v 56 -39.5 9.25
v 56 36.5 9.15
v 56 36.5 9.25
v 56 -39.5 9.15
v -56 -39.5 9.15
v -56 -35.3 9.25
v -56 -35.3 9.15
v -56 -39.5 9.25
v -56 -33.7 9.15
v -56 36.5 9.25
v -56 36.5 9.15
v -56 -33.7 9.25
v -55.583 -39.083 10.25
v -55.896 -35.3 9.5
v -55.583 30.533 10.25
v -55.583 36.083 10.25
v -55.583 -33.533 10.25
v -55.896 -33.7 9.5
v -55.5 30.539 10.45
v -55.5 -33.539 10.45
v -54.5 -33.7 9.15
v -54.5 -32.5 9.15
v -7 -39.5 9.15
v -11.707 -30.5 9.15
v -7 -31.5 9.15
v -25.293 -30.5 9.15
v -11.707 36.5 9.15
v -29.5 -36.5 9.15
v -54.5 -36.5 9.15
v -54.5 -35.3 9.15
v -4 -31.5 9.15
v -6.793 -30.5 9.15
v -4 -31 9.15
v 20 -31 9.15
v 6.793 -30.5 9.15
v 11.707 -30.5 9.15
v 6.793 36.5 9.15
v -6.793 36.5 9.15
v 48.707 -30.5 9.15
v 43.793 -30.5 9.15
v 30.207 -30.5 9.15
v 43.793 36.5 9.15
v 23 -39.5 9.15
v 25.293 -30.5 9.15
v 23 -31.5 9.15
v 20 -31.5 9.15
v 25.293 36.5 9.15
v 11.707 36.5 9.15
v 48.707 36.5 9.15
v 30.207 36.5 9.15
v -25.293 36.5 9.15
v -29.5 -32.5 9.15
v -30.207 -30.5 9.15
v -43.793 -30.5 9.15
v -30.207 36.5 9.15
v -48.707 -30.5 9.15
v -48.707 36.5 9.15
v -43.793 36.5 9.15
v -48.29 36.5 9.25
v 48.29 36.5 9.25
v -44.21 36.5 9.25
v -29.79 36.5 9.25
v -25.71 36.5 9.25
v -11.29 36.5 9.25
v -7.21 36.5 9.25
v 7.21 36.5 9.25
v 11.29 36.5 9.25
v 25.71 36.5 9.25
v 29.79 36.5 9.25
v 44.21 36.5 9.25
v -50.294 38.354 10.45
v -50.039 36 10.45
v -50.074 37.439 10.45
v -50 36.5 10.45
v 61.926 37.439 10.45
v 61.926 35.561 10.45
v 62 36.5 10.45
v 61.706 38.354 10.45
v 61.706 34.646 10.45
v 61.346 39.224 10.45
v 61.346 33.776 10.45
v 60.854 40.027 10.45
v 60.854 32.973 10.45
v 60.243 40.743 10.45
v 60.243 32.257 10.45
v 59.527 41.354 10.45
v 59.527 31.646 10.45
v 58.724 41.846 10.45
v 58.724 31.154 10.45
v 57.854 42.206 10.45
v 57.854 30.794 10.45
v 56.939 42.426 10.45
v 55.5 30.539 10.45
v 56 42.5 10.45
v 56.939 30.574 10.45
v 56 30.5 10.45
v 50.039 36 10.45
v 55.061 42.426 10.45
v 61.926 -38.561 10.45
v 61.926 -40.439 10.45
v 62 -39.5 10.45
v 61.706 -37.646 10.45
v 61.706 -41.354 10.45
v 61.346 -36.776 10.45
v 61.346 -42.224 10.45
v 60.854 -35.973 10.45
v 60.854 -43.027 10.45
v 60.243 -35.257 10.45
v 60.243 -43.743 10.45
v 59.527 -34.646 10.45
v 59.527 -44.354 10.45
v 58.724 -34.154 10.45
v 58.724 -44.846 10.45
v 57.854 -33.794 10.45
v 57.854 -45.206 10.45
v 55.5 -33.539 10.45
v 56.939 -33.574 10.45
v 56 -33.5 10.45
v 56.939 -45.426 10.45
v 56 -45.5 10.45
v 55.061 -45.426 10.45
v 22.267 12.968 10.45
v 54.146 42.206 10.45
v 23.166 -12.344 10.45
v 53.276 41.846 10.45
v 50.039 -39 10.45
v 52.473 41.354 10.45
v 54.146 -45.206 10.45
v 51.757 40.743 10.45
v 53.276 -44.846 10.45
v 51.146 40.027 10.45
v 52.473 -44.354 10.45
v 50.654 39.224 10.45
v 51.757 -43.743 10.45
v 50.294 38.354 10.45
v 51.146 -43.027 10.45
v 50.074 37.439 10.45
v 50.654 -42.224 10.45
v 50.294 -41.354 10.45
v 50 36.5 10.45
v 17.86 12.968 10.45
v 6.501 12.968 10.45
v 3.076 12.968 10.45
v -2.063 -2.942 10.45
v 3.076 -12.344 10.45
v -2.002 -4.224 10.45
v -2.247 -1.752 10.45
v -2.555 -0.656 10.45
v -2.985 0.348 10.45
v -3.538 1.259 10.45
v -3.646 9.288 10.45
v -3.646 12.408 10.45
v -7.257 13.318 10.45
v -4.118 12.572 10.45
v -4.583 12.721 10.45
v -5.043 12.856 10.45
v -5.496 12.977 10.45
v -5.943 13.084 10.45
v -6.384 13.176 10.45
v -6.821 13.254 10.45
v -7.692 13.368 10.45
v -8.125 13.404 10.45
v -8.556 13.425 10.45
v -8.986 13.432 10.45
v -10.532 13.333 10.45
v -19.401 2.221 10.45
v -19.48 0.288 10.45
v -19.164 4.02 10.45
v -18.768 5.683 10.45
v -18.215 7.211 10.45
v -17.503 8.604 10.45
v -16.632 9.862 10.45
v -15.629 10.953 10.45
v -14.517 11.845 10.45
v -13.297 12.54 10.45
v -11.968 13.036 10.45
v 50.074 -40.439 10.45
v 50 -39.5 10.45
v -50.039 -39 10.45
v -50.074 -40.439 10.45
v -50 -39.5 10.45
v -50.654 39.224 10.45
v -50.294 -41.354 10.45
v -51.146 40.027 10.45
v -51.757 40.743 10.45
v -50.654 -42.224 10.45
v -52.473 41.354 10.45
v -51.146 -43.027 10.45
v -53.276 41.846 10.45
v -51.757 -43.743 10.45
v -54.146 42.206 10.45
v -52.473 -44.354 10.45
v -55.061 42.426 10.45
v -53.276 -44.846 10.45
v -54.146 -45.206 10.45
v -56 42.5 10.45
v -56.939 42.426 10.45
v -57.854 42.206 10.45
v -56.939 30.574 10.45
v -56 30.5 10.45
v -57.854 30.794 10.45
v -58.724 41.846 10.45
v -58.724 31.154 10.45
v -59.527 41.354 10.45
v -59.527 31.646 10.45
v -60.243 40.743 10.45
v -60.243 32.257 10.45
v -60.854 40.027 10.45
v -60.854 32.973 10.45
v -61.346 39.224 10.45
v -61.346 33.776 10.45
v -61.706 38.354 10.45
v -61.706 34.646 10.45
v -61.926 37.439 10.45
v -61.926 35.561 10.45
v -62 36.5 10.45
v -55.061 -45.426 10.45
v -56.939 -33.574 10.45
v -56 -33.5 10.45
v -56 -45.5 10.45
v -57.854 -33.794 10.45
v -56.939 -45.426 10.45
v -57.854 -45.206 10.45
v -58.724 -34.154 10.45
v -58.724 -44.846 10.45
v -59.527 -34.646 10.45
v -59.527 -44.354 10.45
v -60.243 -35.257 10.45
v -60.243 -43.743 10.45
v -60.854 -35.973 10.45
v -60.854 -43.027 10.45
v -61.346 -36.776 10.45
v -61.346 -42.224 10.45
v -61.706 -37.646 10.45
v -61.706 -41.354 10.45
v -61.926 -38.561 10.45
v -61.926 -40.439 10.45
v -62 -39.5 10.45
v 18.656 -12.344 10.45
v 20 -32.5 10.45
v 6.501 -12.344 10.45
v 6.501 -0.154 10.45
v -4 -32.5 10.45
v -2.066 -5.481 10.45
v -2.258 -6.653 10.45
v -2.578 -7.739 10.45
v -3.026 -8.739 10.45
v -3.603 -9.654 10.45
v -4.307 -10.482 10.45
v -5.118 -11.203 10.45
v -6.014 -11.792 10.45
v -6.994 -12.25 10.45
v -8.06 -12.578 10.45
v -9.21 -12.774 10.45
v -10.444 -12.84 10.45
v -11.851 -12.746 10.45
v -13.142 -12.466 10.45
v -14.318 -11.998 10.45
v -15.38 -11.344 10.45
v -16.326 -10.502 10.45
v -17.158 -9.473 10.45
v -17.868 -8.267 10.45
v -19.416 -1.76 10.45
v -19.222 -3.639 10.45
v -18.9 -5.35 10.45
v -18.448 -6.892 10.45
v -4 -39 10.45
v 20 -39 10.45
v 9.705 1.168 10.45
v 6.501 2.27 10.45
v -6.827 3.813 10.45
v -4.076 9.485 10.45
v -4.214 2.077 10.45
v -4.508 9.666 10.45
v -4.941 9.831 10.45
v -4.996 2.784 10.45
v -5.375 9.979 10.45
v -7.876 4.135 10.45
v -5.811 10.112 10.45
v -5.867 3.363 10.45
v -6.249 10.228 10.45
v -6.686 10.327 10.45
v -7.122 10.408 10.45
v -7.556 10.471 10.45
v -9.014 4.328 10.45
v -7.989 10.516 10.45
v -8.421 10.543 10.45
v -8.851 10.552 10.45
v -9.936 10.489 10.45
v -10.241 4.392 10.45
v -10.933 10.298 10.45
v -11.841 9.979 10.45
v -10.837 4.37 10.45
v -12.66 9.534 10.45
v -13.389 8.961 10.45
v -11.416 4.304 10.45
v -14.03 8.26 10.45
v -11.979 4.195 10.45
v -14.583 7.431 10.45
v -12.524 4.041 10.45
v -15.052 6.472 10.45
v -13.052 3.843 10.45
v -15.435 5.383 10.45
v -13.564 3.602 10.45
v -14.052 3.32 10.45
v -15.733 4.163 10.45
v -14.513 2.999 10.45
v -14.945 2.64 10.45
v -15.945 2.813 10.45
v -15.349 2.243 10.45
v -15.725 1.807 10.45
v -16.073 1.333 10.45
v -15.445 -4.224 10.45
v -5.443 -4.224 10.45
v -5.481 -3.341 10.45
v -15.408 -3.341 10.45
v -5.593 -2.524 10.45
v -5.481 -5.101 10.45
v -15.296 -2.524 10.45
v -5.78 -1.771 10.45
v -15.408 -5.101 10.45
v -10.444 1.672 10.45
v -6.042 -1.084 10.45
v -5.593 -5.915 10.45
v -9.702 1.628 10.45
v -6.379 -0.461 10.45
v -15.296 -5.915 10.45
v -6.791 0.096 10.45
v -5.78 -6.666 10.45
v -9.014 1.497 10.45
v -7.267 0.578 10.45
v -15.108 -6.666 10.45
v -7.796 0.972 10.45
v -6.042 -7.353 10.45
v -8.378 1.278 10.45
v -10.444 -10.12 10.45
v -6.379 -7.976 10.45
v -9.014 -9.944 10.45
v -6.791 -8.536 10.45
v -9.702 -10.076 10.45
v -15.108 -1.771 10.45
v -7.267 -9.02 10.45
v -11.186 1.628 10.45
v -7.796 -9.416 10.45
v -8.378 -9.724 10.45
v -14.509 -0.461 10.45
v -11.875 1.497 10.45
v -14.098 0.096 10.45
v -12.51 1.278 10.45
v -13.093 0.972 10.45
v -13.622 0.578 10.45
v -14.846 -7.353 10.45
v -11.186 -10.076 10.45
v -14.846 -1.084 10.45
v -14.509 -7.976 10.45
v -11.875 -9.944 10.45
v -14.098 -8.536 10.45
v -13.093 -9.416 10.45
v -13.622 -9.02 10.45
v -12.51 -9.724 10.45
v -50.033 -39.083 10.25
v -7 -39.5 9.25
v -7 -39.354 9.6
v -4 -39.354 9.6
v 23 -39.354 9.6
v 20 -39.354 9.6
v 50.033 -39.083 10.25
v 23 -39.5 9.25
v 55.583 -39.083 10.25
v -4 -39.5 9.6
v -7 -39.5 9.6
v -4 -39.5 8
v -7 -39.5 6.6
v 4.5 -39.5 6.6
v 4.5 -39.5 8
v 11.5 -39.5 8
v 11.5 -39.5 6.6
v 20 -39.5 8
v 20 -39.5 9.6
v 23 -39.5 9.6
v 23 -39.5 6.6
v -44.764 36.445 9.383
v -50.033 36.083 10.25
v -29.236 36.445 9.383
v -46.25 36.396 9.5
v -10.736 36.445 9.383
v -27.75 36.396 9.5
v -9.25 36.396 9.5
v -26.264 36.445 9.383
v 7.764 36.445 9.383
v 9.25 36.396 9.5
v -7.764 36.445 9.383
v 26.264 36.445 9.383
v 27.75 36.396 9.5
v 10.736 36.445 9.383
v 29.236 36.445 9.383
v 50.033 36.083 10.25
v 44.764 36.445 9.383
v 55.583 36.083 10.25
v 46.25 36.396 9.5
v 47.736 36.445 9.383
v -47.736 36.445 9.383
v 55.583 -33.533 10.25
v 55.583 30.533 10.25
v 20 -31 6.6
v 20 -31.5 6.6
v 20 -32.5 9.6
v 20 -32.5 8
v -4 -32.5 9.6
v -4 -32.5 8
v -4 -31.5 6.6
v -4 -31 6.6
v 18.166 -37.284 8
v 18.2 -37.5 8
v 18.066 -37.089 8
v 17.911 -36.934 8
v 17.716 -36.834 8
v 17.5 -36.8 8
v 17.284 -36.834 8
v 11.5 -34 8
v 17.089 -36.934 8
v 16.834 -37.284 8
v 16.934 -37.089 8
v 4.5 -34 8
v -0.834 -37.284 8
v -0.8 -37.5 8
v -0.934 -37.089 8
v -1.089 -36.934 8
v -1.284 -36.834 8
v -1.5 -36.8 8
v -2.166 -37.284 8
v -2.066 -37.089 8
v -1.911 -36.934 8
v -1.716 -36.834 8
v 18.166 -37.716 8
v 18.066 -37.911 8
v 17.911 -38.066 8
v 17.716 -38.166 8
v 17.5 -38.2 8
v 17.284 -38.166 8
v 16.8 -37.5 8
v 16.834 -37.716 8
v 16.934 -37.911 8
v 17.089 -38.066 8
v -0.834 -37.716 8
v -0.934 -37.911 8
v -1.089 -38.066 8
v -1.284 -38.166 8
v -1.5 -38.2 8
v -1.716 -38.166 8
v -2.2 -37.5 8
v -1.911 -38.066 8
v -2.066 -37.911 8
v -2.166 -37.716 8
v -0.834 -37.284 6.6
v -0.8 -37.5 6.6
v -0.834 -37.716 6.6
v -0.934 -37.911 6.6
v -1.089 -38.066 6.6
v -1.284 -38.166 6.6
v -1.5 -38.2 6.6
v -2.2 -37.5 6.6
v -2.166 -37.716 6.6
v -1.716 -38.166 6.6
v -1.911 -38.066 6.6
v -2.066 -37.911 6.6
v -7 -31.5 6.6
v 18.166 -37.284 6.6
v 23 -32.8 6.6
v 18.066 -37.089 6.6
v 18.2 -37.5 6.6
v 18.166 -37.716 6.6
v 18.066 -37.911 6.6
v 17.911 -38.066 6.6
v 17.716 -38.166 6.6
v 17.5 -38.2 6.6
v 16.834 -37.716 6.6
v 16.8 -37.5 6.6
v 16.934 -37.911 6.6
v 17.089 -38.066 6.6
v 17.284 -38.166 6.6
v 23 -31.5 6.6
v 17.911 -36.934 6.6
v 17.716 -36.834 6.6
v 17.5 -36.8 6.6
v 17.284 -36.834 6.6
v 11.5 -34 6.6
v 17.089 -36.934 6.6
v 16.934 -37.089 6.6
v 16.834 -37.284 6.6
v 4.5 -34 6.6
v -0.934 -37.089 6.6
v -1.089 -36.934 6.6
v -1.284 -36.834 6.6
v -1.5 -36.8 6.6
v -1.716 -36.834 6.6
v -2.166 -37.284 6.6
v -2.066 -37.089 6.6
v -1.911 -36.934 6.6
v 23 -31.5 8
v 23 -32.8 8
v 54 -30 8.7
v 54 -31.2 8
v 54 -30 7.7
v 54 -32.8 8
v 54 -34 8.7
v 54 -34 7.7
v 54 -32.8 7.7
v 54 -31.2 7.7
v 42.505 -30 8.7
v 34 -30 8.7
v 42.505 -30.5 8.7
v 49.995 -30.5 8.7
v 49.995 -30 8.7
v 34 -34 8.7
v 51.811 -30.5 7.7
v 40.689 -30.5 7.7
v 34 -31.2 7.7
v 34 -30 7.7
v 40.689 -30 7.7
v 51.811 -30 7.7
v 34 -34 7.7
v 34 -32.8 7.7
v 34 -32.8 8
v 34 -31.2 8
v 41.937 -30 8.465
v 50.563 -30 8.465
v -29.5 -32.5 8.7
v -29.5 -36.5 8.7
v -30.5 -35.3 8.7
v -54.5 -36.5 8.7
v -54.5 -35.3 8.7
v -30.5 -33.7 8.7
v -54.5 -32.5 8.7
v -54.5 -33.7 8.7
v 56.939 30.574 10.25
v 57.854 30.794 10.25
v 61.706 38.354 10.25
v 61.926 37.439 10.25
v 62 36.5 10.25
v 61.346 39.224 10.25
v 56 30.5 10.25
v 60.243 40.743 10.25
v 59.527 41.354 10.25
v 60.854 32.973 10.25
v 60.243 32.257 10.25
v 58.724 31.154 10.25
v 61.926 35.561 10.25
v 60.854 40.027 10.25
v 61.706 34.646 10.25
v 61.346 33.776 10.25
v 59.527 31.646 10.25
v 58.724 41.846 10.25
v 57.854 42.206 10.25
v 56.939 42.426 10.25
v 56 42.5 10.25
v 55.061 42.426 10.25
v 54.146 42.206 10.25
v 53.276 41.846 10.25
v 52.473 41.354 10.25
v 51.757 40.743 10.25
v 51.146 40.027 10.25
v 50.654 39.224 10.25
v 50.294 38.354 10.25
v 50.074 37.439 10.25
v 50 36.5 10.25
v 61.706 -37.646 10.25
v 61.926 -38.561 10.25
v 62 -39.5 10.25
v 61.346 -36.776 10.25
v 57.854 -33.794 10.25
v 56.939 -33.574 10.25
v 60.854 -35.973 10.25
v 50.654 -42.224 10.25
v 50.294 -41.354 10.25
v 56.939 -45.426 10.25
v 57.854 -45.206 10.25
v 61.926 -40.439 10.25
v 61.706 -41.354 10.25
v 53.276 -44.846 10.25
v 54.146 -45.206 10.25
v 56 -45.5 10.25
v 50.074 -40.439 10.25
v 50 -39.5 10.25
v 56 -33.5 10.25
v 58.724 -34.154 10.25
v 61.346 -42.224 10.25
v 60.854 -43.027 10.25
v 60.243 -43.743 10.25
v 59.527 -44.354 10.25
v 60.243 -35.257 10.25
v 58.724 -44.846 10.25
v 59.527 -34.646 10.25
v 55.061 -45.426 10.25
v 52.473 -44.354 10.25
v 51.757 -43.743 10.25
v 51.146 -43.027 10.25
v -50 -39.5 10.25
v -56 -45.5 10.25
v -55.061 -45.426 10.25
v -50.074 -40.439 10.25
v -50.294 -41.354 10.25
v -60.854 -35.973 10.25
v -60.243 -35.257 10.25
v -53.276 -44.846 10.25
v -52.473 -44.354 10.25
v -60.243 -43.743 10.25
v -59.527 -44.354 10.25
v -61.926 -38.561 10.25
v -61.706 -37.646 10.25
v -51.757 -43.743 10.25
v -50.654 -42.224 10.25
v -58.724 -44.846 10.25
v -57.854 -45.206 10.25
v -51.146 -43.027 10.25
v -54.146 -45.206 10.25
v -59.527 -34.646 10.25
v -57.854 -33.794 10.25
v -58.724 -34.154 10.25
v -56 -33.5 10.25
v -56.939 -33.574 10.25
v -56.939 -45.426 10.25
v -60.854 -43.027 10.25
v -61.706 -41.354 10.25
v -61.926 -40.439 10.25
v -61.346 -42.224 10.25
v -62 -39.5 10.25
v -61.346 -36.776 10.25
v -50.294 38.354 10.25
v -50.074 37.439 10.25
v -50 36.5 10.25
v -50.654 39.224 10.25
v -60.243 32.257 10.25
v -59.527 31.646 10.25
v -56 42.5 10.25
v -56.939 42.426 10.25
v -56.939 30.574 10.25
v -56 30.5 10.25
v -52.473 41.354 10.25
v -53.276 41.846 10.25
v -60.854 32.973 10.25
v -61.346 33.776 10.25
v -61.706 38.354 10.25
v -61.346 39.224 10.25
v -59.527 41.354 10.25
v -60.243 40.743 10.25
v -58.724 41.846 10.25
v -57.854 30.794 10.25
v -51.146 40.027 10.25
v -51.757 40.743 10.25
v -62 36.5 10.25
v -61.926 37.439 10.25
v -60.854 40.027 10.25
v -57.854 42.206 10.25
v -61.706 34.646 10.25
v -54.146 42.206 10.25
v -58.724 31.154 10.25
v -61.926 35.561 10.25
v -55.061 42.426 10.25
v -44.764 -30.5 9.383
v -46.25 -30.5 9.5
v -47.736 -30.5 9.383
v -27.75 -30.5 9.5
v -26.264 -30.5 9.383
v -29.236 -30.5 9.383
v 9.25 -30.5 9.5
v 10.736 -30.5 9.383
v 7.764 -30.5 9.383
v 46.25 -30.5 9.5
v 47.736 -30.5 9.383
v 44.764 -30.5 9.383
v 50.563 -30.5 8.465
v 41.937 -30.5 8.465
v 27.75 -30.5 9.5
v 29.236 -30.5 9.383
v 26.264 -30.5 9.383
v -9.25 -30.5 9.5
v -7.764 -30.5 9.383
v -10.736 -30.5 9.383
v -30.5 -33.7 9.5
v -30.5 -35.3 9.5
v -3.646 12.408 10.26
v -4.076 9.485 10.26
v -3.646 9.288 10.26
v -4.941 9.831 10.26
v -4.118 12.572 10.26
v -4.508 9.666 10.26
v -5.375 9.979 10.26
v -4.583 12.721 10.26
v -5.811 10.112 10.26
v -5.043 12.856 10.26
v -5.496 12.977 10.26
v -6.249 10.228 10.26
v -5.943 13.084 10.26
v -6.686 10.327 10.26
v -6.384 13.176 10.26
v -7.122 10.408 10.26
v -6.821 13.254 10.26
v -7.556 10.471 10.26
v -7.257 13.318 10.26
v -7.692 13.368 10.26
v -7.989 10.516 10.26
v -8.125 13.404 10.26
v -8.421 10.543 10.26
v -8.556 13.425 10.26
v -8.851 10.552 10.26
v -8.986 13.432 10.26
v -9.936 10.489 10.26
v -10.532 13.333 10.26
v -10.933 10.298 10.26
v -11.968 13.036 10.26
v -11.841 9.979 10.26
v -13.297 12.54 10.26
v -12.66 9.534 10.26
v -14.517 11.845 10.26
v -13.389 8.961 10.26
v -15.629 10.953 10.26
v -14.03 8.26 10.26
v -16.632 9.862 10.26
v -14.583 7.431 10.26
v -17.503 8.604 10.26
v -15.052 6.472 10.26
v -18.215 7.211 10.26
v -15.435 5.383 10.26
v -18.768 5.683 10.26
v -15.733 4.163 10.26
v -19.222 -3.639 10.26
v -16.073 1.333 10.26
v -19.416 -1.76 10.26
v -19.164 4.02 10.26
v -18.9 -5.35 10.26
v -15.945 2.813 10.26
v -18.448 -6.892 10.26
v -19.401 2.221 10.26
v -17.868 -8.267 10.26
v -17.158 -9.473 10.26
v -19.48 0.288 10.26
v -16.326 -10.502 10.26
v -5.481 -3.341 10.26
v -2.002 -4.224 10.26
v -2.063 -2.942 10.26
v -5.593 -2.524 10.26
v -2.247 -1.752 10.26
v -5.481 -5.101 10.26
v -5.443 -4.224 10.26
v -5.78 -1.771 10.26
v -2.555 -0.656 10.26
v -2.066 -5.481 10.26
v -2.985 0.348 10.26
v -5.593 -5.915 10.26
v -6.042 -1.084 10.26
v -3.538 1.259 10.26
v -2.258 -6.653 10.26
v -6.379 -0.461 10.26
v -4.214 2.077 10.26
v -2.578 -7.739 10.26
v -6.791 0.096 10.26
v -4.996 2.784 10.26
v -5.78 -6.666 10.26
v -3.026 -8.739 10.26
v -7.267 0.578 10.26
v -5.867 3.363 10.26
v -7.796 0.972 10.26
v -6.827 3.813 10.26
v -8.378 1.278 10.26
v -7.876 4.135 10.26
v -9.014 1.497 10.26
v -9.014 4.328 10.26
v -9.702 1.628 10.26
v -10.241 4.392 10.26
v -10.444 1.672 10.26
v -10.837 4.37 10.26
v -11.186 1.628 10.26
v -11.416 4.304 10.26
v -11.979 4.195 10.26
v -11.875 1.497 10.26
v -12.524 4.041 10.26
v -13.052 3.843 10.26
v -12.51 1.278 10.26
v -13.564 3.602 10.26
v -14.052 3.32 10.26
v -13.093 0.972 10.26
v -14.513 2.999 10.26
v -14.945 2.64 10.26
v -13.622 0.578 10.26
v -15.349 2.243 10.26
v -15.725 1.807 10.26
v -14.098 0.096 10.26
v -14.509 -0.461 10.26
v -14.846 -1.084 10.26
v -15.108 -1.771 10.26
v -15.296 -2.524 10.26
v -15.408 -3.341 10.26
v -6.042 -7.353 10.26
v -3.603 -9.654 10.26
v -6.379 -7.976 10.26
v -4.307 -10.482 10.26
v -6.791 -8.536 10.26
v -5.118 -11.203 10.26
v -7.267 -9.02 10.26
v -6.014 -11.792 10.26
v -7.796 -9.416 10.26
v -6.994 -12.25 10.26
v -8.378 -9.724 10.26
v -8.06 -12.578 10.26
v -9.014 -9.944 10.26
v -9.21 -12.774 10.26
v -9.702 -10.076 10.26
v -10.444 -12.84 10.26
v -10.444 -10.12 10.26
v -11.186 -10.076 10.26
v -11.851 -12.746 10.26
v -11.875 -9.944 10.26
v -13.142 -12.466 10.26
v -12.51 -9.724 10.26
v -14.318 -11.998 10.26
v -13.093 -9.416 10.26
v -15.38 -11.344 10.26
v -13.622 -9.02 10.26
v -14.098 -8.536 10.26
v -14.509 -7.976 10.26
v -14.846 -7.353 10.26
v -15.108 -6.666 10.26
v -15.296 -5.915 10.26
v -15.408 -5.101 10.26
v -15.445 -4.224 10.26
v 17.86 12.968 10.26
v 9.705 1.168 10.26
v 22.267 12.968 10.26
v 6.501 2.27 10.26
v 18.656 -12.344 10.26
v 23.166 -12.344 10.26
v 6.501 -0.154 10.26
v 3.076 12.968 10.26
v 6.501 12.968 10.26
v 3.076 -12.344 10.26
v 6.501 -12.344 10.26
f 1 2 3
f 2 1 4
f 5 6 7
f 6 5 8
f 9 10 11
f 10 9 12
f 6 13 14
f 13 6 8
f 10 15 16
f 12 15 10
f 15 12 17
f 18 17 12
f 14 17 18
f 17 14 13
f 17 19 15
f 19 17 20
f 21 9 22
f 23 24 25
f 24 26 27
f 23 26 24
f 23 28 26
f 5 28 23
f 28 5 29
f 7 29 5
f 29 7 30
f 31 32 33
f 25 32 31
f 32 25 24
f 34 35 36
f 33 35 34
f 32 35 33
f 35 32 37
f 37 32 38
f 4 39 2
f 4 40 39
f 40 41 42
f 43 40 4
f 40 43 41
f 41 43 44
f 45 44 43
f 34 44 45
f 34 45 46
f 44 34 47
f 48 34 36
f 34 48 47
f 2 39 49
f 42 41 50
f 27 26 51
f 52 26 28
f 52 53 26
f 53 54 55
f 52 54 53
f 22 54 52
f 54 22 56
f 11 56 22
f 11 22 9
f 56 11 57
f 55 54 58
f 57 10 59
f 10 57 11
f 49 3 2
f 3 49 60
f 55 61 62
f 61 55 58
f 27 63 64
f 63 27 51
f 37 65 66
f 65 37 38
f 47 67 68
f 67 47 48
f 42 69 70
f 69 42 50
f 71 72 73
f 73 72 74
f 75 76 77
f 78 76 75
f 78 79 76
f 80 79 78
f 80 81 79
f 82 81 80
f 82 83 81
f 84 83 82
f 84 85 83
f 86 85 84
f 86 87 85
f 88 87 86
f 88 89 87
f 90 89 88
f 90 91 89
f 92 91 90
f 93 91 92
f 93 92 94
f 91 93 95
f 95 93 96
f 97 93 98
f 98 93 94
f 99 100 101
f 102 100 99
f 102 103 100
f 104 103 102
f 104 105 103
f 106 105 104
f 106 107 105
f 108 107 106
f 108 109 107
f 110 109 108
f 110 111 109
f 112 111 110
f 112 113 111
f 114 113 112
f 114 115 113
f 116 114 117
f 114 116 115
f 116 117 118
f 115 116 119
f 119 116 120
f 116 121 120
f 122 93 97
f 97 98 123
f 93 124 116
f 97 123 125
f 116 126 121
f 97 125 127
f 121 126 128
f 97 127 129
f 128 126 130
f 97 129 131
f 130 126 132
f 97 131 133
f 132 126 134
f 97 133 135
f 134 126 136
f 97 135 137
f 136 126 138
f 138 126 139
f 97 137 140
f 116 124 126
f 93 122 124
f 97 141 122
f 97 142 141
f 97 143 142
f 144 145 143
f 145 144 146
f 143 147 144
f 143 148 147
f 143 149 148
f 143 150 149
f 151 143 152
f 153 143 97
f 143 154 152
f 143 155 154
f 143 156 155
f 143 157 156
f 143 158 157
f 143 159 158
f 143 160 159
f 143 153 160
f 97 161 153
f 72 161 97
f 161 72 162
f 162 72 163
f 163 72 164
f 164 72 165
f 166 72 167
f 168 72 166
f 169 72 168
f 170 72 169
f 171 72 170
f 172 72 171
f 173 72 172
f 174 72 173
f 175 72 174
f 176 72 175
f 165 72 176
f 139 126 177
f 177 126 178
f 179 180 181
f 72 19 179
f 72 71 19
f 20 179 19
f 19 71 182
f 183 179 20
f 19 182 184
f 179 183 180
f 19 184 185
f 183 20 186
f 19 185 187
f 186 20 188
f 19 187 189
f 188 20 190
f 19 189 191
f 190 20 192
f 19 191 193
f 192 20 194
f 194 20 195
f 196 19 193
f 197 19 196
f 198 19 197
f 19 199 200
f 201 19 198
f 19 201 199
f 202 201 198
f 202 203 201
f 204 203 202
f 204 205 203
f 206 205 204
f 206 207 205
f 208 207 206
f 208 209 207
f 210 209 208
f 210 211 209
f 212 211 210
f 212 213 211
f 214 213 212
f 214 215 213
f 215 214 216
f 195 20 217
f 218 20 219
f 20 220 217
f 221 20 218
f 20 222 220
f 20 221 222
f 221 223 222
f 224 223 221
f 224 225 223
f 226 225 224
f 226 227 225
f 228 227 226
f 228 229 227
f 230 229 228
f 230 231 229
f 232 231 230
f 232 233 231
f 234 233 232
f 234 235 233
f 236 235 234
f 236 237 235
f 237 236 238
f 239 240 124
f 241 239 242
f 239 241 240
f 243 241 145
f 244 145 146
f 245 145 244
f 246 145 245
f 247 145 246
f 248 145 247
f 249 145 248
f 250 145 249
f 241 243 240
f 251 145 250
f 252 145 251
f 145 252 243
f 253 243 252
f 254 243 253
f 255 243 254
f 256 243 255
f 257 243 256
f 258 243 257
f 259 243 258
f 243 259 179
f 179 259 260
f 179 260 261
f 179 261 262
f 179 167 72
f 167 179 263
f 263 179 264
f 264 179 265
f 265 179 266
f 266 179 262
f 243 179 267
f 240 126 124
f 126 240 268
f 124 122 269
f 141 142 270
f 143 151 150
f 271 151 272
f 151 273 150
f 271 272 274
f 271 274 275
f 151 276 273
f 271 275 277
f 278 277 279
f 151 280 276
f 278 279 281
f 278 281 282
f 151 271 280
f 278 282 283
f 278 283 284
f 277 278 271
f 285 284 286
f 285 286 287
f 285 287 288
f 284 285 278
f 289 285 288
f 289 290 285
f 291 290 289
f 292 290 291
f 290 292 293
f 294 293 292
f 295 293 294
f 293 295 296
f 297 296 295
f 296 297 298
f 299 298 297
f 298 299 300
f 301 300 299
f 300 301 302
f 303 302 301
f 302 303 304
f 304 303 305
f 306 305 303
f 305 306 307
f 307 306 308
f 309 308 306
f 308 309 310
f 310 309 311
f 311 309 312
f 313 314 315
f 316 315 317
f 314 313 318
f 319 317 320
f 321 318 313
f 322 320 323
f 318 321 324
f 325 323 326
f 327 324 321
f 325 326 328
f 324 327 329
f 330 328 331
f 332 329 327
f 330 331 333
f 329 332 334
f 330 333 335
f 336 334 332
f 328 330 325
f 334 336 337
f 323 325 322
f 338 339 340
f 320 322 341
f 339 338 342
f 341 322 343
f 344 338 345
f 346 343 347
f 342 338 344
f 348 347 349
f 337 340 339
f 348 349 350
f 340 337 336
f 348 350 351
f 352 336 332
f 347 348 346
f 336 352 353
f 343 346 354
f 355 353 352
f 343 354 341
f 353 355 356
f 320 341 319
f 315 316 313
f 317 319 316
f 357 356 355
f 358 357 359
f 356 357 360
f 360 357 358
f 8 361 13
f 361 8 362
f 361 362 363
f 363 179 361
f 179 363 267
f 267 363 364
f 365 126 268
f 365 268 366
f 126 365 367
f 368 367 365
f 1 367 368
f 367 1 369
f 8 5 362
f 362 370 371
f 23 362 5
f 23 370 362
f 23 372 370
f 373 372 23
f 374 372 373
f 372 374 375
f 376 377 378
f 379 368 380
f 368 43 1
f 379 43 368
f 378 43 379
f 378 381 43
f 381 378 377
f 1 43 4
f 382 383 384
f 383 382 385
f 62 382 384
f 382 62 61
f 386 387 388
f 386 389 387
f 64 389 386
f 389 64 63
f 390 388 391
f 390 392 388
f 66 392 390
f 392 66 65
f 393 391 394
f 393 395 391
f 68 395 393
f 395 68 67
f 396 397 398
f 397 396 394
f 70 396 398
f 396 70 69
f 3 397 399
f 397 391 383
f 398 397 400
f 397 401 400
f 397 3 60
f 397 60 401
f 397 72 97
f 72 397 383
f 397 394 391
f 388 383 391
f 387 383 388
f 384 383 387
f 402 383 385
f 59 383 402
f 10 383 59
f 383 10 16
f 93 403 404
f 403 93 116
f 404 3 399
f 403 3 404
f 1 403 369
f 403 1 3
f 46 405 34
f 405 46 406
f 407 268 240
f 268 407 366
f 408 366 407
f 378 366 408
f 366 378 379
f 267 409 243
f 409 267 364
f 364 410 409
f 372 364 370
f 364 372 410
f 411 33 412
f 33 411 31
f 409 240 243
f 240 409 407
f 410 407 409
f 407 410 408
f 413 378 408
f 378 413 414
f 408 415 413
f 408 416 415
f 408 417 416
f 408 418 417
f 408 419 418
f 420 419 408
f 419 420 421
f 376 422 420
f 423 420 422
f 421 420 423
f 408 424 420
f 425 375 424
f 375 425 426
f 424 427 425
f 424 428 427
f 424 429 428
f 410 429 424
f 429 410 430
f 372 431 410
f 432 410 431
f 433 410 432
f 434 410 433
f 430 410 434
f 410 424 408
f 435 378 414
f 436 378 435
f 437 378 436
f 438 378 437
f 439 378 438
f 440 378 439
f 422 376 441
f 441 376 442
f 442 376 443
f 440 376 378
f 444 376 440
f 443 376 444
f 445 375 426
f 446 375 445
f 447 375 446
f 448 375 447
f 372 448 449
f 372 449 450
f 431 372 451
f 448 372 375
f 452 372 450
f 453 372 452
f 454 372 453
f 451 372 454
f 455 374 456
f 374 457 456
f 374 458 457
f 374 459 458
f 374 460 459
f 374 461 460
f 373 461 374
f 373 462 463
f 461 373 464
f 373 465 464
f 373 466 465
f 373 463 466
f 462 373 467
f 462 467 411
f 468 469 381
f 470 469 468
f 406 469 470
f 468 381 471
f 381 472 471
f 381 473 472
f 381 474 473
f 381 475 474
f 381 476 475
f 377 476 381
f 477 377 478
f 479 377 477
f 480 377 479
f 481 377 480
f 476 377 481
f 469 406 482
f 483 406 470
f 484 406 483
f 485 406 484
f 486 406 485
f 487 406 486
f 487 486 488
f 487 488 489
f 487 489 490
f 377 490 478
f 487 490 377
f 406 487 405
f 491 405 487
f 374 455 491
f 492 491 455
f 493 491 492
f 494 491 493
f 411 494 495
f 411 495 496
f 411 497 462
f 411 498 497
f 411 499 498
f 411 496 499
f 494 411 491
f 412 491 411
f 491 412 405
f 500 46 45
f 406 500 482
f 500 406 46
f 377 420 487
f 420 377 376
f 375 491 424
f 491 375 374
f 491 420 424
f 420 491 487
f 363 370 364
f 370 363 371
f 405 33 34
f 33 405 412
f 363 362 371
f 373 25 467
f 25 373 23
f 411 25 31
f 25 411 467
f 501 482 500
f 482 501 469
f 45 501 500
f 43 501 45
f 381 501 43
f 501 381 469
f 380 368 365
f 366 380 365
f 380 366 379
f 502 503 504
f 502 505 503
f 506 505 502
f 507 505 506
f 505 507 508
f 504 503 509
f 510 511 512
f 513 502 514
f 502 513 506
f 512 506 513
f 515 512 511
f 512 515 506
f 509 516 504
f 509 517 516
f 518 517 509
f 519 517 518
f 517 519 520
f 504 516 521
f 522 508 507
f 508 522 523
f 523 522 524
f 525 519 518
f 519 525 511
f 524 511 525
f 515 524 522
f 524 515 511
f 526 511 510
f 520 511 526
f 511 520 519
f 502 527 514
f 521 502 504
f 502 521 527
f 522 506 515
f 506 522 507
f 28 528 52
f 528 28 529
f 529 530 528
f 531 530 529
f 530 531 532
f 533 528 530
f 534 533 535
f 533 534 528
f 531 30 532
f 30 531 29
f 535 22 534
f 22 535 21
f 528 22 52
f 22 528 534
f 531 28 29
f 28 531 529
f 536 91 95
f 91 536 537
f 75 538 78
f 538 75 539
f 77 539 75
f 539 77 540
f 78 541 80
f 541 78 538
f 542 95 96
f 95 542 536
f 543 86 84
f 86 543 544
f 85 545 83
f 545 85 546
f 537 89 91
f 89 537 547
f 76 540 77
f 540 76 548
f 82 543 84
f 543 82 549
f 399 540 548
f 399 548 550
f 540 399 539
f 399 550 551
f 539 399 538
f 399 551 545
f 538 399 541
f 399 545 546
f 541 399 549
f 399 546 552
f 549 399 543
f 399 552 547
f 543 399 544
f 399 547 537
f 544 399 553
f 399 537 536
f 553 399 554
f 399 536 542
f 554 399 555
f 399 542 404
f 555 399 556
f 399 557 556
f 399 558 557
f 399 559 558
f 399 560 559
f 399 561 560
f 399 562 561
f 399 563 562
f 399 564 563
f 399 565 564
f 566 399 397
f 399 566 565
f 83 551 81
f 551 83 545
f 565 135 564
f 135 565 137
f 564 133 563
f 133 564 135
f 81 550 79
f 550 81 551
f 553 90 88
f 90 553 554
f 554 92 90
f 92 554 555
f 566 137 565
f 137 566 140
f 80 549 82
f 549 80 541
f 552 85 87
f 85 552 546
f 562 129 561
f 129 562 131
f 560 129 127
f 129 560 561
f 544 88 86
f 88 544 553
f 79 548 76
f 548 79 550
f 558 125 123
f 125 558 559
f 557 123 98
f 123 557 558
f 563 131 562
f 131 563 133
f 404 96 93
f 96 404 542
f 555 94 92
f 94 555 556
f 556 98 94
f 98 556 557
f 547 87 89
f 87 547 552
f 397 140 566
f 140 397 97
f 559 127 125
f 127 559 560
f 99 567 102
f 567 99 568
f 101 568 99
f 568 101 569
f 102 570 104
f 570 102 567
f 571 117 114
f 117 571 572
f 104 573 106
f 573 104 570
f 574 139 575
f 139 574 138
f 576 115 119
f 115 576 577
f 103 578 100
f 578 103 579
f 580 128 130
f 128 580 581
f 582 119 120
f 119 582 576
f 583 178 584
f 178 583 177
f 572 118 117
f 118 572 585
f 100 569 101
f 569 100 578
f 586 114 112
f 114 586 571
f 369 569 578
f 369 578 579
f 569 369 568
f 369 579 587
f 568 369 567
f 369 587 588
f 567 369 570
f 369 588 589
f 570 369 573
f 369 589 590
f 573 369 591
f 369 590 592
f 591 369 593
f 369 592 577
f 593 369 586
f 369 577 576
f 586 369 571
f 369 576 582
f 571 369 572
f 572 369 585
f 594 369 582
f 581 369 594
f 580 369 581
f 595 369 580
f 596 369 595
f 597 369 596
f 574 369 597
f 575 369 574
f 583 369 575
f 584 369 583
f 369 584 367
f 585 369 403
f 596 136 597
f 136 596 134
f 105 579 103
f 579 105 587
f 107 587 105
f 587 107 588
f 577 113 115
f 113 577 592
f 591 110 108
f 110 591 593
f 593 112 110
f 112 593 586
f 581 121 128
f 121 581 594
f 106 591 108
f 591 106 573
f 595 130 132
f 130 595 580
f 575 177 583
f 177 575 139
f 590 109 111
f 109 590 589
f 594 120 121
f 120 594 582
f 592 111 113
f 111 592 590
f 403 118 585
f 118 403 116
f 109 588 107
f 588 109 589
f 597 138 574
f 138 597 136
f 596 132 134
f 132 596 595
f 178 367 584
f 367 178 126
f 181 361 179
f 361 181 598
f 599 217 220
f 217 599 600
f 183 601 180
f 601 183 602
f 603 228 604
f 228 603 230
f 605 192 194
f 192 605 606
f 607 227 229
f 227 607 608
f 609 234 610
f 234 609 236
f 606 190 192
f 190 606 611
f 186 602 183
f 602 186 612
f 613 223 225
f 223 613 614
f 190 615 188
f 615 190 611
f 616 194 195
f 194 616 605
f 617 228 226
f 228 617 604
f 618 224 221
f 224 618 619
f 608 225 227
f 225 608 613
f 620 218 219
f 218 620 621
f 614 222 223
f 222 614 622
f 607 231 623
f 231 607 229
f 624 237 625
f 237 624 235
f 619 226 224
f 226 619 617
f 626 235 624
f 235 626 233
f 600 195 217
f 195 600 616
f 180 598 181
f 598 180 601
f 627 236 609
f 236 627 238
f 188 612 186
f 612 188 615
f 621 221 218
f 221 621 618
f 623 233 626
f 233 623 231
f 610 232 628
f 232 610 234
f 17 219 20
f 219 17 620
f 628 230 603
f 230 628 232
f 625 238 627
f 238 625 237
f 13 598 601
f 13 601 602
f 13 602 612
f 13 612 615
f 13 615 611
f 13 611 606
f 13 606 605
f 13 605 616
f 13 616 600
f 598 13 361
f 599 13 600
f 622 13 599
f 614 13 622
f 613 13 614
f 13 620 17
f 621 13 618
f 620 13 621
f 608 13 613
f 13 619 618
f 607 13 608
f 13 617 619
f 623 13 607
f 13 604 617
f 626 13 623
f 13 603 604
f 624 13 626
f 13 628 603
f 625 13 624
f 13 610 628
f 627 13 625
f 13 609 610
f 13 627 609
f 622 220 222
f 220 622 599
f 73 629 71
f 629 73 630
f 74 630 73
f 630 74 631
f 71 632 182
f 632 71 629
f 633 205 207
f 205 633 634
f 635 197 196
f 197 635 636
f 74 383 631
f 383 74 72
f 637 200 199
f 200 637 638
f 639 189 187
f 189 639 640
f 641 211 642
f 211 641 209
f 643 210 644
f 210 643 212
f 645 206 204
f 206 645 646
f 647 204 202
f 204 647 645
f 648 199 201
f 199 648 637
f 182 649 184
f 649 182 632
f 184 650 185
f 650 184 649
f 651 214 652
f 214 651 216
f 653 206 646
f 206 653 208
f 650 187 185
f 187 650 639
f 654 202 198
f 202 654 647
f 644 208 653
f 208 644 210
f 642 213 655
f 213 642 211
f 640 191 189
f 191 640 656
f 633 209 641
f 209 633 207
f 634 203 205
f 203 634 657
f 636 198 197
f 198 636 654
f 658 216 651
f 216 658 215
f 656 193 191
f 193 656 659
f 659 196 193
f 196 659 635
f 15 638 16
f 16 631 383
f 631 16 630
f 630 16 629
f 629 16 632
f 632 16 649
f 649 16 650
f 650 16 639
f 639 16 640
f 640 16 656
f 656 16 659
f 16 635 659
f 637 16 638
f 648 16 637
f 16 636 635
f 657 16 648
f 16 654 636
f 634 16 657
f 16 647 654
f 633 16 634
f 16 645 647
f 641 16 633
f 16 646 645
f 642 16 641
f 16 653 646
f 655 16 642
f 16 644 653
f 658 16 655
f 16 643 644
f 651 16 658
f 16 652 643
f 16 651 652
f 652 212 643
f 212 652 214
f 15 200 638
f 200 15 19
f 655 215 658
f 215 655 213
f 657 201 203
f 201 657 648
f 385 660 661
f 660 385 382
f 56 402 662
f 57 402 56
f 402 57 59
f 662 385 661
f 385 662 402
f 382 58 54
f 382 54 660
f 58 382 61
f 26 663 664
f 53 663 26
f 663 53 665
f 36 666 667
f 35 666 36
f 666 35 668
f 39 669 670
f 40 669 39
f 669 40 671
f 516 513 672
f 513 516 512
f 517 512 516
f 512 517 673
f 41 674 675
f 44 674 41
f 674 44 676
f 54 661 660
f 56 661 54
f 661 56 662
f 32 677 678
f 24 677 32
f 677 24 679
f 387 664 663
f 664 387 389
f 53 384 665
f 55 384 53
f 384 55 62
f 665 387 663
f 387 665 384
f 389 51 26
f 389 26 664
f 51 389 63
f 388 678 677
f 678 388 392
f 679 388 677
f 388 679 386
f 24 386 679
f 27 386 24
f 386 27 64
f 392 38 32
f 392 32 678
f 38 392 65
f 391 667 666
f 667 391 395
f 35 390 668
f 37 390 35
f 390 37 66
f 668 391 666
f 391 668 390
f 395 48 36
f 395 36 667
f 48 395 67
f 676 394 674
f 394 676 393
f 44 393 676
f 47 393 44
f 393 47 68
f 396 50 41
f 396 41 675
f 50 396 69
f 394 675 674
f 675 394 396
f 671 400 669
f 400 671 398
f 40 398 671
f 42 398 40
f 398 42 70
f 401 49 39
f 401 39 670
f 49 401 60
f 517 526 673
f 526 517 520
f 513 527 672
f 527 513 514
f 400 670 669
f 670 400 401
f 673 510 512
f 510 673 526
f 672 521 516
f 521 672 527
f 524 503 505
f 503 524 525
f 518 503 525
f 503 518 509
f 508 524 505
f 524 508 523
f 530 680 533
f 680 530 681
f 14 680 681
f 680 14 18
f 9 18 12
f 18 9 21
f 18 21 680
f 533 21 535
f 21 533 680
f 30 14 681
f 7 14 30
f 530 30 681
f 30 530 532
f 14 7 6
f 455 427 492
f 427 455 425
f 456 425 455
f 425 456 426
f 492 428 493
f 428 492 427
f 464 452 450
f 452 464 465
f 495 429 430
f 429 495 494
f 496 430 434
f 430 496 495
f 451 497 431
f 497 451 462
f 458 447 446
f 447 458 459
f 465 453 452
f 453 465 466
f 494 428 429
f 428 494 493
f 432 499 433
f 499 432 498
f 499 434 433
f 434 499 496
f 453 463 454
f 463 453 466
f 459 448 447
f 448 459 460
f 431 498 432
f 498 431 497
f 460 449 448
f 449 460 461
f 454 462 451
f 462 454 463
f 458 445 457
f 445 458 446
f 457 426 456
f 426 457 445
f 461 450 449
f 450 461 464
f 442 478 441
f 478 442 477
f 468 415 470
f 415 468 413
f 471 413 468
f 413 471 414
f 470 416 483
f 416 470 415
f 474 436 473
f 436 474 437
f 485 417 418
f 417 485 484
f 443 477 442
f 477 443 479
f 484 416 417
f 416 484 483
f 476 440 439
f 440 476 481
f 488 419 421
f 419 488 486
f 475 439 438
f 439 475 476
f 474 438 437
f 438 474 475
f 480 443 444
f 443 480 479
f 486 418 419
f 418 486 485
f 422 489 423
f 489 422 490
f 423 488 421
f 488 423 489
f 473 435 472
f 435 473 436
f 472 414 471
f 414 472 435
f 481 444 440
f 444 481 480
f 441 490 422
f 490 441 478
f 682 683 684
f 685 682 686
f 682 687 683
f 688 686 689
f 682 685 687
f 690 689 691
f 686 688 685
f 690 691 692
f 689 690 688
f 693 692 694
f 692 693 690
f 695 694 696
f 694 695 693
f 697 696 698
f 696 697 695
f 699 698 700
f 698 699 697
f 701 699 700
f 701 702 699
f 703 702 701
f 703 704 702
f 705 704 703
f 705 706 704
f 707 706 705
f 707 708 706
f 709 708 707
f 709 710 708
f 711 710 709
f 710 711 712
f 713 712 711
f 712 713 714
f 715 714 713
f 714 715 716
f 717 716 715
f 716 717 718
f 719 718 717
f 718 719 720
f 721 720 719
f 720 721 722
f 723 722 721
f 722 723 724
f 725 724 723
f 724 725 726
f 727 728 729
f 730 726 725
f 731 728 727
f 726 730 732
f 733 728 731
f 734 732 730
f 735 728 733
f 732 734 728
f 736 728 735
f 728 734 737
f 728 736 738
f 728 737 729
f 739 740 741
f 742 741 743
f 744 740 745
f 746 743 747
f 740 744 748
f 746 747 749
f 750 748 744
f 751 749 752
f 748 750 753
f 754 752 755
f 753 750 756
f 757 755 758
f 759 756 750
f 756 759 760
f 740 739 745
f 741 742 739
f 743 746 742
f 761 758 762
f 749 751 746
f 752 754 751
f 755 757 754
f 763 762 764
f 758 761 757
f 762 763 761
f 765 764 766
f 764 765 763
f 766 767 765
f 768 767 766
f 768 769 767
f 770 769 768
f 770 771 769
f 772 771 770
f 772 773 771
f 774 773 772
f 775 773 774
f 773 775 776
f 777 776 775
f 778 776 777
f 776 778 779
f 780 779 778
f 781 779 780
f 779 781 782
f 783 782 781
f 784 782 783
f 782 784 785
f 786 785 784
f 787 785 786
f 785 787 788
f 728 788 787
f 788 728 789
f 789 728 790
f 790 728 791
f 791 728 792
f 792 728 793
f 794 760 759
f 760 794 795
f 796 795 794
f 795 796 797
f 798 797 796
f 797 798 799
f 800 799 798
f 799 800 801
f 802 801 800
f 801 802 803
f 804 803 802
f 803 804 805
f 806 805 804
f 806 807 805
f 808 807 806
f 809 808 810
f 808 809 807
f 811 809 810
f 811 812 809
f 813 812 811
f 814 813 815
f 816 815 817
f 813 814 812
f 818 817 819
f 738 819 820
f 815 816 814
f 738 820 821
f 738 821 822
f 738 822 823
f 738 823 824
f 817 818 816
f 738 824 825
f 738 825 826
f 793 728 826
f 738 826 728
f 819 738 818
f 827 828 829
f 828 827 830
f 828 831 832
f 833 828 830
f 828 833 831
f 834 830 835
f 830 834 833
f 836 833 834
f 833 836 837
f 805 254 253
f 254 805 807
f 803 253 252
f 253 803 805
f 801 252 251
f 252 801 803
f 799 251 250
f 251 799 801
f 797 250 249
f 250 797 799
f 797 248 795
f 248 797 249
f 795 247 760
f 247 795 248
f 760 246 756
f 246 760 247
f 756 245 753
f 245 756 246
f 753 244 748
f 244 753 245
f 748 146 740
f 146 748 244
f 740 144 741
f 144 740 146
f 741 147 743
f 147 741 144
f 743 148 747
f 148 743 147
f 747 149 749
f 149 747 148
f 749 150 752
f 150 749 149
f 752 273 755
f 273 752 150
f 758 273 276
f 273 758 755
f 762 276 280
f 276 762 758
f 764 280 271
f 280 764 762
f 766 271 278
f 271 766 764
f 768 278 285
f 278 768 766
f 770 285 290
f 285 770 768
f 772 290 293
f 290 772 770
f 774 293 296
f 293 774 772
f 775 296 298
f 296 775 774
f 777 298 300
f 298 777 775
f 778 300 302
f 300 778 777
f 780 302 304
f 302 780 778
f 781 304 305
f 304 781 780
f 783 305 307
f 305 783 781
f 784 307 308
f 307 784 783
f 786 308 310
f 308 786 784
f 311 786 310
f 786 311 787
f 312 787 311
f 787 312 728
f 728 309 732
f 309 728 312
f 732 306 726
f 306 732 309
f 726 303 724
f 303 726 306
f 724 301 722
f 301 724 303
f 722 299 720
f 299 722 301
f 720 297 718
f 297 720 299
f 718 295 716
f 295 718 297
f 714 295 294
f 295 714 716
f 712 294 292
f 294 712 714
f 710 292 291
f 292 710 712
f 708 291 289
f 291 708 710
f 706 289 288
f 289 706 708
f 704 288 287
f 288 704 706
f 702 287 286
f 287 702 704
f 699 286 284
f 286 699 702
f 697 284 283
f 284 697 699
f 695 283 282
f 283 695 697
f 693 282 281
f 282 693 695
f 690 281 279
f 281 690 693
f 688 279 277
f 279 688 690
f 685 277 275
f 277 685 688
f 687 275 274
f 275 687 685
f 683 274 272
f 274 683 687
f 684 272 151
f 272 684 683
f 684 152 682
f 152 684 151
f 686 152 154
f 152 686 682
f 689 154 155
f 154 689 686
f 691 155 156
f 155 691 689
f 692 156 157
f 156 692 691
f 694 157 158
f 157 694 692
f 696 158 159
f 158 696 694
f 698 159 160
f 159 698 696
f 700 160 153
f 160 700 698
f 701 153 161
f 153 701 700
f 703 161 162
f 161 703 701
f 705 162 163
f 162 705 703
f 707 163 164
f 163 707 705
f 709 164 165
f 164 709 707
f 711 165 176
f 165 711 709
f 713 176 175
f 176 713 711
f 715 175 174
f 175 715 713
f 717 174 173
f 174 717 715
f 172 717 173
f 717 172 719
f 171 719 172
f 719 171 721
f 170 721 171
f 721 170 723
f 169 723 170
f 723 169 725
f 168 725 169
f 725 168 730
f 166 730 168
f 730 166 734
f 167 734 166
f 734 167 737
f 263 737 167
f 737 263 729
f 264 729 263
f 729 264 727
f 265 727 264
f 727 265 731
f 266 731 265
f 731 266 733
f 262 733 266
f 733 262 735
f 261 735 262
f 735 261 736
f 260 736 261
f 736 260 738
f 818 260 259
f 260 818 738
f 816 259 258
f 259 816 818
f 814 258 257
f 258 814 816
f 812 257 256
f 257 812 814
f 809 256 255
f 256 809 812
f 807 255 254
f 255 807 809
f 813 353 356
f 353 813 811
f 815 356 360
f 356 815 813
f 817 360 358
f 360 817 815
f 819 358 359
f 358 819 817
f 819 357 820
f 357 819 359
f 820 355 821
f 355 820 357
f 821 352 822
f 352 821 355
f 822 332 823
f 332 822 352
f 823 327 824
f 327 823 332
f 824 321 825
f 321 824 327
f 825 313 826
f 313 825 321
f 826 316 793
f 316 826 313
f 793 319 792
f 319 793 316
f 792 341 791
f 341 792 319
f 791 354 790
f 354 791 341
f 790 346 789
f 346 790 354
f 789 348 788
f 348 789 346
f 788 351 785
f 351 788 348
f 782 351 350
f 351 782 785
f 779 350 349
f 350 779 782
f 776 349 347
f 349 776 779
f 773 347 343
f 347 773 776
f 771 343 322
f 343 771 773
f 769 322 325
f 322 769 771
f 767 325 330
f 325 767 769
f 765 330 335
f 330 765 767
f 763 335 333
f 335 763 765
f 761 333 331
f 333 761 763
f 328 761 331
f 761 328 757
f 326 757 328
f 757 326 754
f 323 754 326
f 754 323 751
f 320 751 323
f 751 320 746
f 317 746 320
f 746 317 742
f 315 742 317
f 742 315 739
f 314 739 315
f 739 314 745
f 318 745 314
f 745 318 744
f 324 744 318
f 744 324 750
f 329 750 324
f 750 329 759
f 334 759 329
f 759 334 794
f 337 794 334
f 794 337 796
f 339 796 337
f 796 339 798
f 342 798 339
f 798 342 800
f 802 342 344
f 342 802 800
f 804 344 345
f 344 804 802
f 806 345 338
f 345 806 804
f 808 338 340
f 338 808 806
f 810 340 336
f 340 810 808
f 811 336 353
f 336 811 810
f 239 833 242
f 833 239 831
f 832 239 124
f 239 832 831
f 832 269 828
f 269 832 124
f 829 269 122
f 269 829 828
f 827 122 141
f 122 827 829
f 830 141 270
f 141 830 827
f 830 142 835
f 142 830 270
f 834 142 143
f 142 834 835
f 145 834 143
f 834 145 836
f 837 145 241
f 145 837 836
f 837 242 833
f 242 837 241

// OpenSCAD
$fn=40;
//Batteries(18.2,65);
//translate([-43.5,-34.5,0])TP4056();
//translate([40,-32,0])StepUp();
//translate([0,-33,-2])SwitchBoard();


//difference(){
//    mainBox();
//    translate([-1.5,-37.5,4])screwSocket();
//    translate([17.5,-37.5,4])screwSocket();

    difference(){
      translate([0,-1.5,9.2])topCover();
      Batteries(19,67);
      translate([-1.5,-37.5,4])cylinder(d=1.4, h=10, center=true,$fn=20);
      translate([17.5,-37.5,4])cylinder(d=1.4, h=10, center=true,$fn=20);
      translate([40,-32,0])StepUp();
      translate([-43.5,-34.5,0])TP4056();
      translate([0,0,10.26])linear_extrude(height = 0.2)
        text("6K", size = 25, font = "Arial Black", halign = "center", valign = "center", $fn = 40);

    }

  //translate([-100,-50,-100])cube([100,100,100]);
//}

module mainBox(){
  difference(){
      translate([0,-1.5,0])box(118,82,21,3,1.3);
      translate([8,-37,10.5])cutOutSW();
      translate([-43.5,-34.5,0])TP4056();
      translate([0,-33,-2])SwitchBoard();
      Batteries(19,67);
      //translate([50,-32-4.2,0])cube([20,6.8,13.2],true);//stepup
      translate([55,-32-4.2,0])cube([10,7.5,14.5],true);//stepup
      // vent holes
      for(i1=[0:4:15])for(i=[0:5:40])translate([-50+i,-37,6-i1])cube([1,10,1],true);
      for(i1=[0:4:15])for(i=[0:5:20])translate([24+i,-37,6-i1])cube([1,10,1],true);
  }
  translate([-56.5,36.8,21/2-1.5])rotate([0,0,-90])bordjur(113);
  difference(){
    translate([56.5,-39.8,21/2-1.5])rotate([0,0,90])bordjur(113);
    translate([8,-37,10])cutOutSW();
    translate([8,-38,6.6])cube([30,5,5],true);
  }
  difference(){
    translate([-56.3,-40,21/2-1.5])bordjur(77);
    translate([-56.4,-36,21/2-5.4])cube([3,3,4]);
  }
  translate([56.3,37,21/2-1.5])rotate([0,0,180])bordjur(77);
}

module TP4056(){
    color("BLUE")cube([26,1.6,19],true);
    color("GRAY")translate([-10,-2.8,0])cube([9.2,4.3,7.8],true);
    color("RED")translate([3,-1,7])cube([1,1,2],true);
    color("GREEN")translate([6,-1,7])cube([1,1,2],true);
}

module StepUp(){
    color("BLUE")cube([34,1.6,16],true);
    color("GRAY")translate([10,-4.2,0])cube([14.5,6.8,13.2],true);
    color("RED")translate([-10.5,-1,7-3.5])cube([1,1,2],true);
}

module SwitchBoard(){
    color("GREEN")cube([37,2,15],true);
    color("GRAY")translate([8,-3.7,5])cube([13,5.5,7],true);
    color("BLACK")translate([8+1.5,-3.7,10.5])cube([3,3,4],true);
}

module box(x,y,z,d,wall){
    translate([0,0,-z/2])linear_extrude(height=z){
        difference(){
            hull(){
                translate([x/2-d,y/2-d])circle(d=d,$fn=25);
                translate([x/2-d,-y/2+d])circle(d=d,$fn=25);
                translate([-x/2+d,-y/2+d])circle(d=d,$fn=25);
                translate([-x/2+d,y/2-d])circle(d=d,$fn=25);
            }
            d1=d-wall*2;
            hull(){
                translate([x/2-d,y/2-d])circle(d=d1,$fn=10);
                translate([x/2-d,-y/2+d])circle(d=d1,$fn=10);
                translate([-x/2+d,-y/2+d])circle(d=d1,$fn=10);
                translate([-x/2+d,y/2-d])circle(d=d1,$fn=10);
            }
        }
    }
    translate([0,0,-z/2])linear_extrude(height=1.5)hull(){
        translate([x/2-d,y/2-d])circle(d=d,$fn=25);
        translate([x/2-d,-y/2+d])circle(d=d,$fn=25);
        translate([-x/2+d,-y/2+d])circle(d=d,$fn=25);
        translate([-x/2+d,y/2-d])circle(d=d,$fn=25);
    }


    // for TP
    translate([-43,-33,-z/2+1.5])linear_extrude(height=1)square([27,4],true);
    // for SW
    translate([0,-31.5,-z/2+1.5])linear_extrude(height=1)
    square([39,5],true);
    //stepup
    translate([22,-32.5,-z/2+1.5])cube([35,4,0.8]);
    translate([46.5,-30.5,-z/2+1.5+0.8])linear_extrude(height=1)difference(){
        square([20,4],true);
        square([30,1.6],true);
    }
}

module cutOutSW(){
    rotate([90,0,0])linear_extrude(height=5)hull(){
        square([24,5],true);
        translate([0,4])square([24,5],true);
    }
}

module Batteries(bd,hg){
    for(i=[-18.5*2.5:18.5:18.5*2.5])translate([i,3,0])rotate([90,0,0])color("LIGHTBLUE")cylinder(d=bd,h=hg,center=true);
}

module screwSocket(){
  difference(){
    hull(){
      cube([5,5,5],true);
      translate([0,-2.5,-4])cube([5,1,5],true);
    }
    cylinder(d=1,h=8,center=true,$fn=10);
  }
}

module bordjur(l){
  rotate([-90,0,0])linear_extrude(height=l)polygon(points=[[0,0],[1,0],[0,3]]);
  rotate([-90,0,0])linear_extrude(height=l)polygon(points=[[0,0],[0,-1.5],[0.5,-1.5]]);
}

module topCover(){
  difference(){
    hull(){
      cube([112,76,0.1],true);
      translate([0,0,1.2])cube([112-1,76-1,0.1],true);
    }
    translate([8,-36,0])cube([24,10,5],true);
  }
  
  difference(){
    translate([8,-34,-1.9])cube([24,8,1.4],true);
    translate([8,-36,0])cube([7,7,50],true);//switch
  }

  translate([8,-30.25,-1.1])cube([24,1.5,3],true);
  
  translate([-5.5,-34,-1.1])cube([3,8,3],true);
  translate([21.5,-34,-1.1])cube([3,8,3],true);
  translate([44,-30.5,-1])cube([20,4,1],true);//stepup
  translate([-42,-33,0])cube([25,4,1],true);//TP4056
  
  translate([112/2,76/2,1.05])cylinder(d=12,h=0.2);
  translate([112/2,-76/2,1.05])cylinder(d=12,h=0.2);
  translate([-112/2,-76/2,1.05])cylinder(d=12,h=0.2);
  translate([-112/2,76/2,1.05])cylinder(d=12,h=0.2);

}
